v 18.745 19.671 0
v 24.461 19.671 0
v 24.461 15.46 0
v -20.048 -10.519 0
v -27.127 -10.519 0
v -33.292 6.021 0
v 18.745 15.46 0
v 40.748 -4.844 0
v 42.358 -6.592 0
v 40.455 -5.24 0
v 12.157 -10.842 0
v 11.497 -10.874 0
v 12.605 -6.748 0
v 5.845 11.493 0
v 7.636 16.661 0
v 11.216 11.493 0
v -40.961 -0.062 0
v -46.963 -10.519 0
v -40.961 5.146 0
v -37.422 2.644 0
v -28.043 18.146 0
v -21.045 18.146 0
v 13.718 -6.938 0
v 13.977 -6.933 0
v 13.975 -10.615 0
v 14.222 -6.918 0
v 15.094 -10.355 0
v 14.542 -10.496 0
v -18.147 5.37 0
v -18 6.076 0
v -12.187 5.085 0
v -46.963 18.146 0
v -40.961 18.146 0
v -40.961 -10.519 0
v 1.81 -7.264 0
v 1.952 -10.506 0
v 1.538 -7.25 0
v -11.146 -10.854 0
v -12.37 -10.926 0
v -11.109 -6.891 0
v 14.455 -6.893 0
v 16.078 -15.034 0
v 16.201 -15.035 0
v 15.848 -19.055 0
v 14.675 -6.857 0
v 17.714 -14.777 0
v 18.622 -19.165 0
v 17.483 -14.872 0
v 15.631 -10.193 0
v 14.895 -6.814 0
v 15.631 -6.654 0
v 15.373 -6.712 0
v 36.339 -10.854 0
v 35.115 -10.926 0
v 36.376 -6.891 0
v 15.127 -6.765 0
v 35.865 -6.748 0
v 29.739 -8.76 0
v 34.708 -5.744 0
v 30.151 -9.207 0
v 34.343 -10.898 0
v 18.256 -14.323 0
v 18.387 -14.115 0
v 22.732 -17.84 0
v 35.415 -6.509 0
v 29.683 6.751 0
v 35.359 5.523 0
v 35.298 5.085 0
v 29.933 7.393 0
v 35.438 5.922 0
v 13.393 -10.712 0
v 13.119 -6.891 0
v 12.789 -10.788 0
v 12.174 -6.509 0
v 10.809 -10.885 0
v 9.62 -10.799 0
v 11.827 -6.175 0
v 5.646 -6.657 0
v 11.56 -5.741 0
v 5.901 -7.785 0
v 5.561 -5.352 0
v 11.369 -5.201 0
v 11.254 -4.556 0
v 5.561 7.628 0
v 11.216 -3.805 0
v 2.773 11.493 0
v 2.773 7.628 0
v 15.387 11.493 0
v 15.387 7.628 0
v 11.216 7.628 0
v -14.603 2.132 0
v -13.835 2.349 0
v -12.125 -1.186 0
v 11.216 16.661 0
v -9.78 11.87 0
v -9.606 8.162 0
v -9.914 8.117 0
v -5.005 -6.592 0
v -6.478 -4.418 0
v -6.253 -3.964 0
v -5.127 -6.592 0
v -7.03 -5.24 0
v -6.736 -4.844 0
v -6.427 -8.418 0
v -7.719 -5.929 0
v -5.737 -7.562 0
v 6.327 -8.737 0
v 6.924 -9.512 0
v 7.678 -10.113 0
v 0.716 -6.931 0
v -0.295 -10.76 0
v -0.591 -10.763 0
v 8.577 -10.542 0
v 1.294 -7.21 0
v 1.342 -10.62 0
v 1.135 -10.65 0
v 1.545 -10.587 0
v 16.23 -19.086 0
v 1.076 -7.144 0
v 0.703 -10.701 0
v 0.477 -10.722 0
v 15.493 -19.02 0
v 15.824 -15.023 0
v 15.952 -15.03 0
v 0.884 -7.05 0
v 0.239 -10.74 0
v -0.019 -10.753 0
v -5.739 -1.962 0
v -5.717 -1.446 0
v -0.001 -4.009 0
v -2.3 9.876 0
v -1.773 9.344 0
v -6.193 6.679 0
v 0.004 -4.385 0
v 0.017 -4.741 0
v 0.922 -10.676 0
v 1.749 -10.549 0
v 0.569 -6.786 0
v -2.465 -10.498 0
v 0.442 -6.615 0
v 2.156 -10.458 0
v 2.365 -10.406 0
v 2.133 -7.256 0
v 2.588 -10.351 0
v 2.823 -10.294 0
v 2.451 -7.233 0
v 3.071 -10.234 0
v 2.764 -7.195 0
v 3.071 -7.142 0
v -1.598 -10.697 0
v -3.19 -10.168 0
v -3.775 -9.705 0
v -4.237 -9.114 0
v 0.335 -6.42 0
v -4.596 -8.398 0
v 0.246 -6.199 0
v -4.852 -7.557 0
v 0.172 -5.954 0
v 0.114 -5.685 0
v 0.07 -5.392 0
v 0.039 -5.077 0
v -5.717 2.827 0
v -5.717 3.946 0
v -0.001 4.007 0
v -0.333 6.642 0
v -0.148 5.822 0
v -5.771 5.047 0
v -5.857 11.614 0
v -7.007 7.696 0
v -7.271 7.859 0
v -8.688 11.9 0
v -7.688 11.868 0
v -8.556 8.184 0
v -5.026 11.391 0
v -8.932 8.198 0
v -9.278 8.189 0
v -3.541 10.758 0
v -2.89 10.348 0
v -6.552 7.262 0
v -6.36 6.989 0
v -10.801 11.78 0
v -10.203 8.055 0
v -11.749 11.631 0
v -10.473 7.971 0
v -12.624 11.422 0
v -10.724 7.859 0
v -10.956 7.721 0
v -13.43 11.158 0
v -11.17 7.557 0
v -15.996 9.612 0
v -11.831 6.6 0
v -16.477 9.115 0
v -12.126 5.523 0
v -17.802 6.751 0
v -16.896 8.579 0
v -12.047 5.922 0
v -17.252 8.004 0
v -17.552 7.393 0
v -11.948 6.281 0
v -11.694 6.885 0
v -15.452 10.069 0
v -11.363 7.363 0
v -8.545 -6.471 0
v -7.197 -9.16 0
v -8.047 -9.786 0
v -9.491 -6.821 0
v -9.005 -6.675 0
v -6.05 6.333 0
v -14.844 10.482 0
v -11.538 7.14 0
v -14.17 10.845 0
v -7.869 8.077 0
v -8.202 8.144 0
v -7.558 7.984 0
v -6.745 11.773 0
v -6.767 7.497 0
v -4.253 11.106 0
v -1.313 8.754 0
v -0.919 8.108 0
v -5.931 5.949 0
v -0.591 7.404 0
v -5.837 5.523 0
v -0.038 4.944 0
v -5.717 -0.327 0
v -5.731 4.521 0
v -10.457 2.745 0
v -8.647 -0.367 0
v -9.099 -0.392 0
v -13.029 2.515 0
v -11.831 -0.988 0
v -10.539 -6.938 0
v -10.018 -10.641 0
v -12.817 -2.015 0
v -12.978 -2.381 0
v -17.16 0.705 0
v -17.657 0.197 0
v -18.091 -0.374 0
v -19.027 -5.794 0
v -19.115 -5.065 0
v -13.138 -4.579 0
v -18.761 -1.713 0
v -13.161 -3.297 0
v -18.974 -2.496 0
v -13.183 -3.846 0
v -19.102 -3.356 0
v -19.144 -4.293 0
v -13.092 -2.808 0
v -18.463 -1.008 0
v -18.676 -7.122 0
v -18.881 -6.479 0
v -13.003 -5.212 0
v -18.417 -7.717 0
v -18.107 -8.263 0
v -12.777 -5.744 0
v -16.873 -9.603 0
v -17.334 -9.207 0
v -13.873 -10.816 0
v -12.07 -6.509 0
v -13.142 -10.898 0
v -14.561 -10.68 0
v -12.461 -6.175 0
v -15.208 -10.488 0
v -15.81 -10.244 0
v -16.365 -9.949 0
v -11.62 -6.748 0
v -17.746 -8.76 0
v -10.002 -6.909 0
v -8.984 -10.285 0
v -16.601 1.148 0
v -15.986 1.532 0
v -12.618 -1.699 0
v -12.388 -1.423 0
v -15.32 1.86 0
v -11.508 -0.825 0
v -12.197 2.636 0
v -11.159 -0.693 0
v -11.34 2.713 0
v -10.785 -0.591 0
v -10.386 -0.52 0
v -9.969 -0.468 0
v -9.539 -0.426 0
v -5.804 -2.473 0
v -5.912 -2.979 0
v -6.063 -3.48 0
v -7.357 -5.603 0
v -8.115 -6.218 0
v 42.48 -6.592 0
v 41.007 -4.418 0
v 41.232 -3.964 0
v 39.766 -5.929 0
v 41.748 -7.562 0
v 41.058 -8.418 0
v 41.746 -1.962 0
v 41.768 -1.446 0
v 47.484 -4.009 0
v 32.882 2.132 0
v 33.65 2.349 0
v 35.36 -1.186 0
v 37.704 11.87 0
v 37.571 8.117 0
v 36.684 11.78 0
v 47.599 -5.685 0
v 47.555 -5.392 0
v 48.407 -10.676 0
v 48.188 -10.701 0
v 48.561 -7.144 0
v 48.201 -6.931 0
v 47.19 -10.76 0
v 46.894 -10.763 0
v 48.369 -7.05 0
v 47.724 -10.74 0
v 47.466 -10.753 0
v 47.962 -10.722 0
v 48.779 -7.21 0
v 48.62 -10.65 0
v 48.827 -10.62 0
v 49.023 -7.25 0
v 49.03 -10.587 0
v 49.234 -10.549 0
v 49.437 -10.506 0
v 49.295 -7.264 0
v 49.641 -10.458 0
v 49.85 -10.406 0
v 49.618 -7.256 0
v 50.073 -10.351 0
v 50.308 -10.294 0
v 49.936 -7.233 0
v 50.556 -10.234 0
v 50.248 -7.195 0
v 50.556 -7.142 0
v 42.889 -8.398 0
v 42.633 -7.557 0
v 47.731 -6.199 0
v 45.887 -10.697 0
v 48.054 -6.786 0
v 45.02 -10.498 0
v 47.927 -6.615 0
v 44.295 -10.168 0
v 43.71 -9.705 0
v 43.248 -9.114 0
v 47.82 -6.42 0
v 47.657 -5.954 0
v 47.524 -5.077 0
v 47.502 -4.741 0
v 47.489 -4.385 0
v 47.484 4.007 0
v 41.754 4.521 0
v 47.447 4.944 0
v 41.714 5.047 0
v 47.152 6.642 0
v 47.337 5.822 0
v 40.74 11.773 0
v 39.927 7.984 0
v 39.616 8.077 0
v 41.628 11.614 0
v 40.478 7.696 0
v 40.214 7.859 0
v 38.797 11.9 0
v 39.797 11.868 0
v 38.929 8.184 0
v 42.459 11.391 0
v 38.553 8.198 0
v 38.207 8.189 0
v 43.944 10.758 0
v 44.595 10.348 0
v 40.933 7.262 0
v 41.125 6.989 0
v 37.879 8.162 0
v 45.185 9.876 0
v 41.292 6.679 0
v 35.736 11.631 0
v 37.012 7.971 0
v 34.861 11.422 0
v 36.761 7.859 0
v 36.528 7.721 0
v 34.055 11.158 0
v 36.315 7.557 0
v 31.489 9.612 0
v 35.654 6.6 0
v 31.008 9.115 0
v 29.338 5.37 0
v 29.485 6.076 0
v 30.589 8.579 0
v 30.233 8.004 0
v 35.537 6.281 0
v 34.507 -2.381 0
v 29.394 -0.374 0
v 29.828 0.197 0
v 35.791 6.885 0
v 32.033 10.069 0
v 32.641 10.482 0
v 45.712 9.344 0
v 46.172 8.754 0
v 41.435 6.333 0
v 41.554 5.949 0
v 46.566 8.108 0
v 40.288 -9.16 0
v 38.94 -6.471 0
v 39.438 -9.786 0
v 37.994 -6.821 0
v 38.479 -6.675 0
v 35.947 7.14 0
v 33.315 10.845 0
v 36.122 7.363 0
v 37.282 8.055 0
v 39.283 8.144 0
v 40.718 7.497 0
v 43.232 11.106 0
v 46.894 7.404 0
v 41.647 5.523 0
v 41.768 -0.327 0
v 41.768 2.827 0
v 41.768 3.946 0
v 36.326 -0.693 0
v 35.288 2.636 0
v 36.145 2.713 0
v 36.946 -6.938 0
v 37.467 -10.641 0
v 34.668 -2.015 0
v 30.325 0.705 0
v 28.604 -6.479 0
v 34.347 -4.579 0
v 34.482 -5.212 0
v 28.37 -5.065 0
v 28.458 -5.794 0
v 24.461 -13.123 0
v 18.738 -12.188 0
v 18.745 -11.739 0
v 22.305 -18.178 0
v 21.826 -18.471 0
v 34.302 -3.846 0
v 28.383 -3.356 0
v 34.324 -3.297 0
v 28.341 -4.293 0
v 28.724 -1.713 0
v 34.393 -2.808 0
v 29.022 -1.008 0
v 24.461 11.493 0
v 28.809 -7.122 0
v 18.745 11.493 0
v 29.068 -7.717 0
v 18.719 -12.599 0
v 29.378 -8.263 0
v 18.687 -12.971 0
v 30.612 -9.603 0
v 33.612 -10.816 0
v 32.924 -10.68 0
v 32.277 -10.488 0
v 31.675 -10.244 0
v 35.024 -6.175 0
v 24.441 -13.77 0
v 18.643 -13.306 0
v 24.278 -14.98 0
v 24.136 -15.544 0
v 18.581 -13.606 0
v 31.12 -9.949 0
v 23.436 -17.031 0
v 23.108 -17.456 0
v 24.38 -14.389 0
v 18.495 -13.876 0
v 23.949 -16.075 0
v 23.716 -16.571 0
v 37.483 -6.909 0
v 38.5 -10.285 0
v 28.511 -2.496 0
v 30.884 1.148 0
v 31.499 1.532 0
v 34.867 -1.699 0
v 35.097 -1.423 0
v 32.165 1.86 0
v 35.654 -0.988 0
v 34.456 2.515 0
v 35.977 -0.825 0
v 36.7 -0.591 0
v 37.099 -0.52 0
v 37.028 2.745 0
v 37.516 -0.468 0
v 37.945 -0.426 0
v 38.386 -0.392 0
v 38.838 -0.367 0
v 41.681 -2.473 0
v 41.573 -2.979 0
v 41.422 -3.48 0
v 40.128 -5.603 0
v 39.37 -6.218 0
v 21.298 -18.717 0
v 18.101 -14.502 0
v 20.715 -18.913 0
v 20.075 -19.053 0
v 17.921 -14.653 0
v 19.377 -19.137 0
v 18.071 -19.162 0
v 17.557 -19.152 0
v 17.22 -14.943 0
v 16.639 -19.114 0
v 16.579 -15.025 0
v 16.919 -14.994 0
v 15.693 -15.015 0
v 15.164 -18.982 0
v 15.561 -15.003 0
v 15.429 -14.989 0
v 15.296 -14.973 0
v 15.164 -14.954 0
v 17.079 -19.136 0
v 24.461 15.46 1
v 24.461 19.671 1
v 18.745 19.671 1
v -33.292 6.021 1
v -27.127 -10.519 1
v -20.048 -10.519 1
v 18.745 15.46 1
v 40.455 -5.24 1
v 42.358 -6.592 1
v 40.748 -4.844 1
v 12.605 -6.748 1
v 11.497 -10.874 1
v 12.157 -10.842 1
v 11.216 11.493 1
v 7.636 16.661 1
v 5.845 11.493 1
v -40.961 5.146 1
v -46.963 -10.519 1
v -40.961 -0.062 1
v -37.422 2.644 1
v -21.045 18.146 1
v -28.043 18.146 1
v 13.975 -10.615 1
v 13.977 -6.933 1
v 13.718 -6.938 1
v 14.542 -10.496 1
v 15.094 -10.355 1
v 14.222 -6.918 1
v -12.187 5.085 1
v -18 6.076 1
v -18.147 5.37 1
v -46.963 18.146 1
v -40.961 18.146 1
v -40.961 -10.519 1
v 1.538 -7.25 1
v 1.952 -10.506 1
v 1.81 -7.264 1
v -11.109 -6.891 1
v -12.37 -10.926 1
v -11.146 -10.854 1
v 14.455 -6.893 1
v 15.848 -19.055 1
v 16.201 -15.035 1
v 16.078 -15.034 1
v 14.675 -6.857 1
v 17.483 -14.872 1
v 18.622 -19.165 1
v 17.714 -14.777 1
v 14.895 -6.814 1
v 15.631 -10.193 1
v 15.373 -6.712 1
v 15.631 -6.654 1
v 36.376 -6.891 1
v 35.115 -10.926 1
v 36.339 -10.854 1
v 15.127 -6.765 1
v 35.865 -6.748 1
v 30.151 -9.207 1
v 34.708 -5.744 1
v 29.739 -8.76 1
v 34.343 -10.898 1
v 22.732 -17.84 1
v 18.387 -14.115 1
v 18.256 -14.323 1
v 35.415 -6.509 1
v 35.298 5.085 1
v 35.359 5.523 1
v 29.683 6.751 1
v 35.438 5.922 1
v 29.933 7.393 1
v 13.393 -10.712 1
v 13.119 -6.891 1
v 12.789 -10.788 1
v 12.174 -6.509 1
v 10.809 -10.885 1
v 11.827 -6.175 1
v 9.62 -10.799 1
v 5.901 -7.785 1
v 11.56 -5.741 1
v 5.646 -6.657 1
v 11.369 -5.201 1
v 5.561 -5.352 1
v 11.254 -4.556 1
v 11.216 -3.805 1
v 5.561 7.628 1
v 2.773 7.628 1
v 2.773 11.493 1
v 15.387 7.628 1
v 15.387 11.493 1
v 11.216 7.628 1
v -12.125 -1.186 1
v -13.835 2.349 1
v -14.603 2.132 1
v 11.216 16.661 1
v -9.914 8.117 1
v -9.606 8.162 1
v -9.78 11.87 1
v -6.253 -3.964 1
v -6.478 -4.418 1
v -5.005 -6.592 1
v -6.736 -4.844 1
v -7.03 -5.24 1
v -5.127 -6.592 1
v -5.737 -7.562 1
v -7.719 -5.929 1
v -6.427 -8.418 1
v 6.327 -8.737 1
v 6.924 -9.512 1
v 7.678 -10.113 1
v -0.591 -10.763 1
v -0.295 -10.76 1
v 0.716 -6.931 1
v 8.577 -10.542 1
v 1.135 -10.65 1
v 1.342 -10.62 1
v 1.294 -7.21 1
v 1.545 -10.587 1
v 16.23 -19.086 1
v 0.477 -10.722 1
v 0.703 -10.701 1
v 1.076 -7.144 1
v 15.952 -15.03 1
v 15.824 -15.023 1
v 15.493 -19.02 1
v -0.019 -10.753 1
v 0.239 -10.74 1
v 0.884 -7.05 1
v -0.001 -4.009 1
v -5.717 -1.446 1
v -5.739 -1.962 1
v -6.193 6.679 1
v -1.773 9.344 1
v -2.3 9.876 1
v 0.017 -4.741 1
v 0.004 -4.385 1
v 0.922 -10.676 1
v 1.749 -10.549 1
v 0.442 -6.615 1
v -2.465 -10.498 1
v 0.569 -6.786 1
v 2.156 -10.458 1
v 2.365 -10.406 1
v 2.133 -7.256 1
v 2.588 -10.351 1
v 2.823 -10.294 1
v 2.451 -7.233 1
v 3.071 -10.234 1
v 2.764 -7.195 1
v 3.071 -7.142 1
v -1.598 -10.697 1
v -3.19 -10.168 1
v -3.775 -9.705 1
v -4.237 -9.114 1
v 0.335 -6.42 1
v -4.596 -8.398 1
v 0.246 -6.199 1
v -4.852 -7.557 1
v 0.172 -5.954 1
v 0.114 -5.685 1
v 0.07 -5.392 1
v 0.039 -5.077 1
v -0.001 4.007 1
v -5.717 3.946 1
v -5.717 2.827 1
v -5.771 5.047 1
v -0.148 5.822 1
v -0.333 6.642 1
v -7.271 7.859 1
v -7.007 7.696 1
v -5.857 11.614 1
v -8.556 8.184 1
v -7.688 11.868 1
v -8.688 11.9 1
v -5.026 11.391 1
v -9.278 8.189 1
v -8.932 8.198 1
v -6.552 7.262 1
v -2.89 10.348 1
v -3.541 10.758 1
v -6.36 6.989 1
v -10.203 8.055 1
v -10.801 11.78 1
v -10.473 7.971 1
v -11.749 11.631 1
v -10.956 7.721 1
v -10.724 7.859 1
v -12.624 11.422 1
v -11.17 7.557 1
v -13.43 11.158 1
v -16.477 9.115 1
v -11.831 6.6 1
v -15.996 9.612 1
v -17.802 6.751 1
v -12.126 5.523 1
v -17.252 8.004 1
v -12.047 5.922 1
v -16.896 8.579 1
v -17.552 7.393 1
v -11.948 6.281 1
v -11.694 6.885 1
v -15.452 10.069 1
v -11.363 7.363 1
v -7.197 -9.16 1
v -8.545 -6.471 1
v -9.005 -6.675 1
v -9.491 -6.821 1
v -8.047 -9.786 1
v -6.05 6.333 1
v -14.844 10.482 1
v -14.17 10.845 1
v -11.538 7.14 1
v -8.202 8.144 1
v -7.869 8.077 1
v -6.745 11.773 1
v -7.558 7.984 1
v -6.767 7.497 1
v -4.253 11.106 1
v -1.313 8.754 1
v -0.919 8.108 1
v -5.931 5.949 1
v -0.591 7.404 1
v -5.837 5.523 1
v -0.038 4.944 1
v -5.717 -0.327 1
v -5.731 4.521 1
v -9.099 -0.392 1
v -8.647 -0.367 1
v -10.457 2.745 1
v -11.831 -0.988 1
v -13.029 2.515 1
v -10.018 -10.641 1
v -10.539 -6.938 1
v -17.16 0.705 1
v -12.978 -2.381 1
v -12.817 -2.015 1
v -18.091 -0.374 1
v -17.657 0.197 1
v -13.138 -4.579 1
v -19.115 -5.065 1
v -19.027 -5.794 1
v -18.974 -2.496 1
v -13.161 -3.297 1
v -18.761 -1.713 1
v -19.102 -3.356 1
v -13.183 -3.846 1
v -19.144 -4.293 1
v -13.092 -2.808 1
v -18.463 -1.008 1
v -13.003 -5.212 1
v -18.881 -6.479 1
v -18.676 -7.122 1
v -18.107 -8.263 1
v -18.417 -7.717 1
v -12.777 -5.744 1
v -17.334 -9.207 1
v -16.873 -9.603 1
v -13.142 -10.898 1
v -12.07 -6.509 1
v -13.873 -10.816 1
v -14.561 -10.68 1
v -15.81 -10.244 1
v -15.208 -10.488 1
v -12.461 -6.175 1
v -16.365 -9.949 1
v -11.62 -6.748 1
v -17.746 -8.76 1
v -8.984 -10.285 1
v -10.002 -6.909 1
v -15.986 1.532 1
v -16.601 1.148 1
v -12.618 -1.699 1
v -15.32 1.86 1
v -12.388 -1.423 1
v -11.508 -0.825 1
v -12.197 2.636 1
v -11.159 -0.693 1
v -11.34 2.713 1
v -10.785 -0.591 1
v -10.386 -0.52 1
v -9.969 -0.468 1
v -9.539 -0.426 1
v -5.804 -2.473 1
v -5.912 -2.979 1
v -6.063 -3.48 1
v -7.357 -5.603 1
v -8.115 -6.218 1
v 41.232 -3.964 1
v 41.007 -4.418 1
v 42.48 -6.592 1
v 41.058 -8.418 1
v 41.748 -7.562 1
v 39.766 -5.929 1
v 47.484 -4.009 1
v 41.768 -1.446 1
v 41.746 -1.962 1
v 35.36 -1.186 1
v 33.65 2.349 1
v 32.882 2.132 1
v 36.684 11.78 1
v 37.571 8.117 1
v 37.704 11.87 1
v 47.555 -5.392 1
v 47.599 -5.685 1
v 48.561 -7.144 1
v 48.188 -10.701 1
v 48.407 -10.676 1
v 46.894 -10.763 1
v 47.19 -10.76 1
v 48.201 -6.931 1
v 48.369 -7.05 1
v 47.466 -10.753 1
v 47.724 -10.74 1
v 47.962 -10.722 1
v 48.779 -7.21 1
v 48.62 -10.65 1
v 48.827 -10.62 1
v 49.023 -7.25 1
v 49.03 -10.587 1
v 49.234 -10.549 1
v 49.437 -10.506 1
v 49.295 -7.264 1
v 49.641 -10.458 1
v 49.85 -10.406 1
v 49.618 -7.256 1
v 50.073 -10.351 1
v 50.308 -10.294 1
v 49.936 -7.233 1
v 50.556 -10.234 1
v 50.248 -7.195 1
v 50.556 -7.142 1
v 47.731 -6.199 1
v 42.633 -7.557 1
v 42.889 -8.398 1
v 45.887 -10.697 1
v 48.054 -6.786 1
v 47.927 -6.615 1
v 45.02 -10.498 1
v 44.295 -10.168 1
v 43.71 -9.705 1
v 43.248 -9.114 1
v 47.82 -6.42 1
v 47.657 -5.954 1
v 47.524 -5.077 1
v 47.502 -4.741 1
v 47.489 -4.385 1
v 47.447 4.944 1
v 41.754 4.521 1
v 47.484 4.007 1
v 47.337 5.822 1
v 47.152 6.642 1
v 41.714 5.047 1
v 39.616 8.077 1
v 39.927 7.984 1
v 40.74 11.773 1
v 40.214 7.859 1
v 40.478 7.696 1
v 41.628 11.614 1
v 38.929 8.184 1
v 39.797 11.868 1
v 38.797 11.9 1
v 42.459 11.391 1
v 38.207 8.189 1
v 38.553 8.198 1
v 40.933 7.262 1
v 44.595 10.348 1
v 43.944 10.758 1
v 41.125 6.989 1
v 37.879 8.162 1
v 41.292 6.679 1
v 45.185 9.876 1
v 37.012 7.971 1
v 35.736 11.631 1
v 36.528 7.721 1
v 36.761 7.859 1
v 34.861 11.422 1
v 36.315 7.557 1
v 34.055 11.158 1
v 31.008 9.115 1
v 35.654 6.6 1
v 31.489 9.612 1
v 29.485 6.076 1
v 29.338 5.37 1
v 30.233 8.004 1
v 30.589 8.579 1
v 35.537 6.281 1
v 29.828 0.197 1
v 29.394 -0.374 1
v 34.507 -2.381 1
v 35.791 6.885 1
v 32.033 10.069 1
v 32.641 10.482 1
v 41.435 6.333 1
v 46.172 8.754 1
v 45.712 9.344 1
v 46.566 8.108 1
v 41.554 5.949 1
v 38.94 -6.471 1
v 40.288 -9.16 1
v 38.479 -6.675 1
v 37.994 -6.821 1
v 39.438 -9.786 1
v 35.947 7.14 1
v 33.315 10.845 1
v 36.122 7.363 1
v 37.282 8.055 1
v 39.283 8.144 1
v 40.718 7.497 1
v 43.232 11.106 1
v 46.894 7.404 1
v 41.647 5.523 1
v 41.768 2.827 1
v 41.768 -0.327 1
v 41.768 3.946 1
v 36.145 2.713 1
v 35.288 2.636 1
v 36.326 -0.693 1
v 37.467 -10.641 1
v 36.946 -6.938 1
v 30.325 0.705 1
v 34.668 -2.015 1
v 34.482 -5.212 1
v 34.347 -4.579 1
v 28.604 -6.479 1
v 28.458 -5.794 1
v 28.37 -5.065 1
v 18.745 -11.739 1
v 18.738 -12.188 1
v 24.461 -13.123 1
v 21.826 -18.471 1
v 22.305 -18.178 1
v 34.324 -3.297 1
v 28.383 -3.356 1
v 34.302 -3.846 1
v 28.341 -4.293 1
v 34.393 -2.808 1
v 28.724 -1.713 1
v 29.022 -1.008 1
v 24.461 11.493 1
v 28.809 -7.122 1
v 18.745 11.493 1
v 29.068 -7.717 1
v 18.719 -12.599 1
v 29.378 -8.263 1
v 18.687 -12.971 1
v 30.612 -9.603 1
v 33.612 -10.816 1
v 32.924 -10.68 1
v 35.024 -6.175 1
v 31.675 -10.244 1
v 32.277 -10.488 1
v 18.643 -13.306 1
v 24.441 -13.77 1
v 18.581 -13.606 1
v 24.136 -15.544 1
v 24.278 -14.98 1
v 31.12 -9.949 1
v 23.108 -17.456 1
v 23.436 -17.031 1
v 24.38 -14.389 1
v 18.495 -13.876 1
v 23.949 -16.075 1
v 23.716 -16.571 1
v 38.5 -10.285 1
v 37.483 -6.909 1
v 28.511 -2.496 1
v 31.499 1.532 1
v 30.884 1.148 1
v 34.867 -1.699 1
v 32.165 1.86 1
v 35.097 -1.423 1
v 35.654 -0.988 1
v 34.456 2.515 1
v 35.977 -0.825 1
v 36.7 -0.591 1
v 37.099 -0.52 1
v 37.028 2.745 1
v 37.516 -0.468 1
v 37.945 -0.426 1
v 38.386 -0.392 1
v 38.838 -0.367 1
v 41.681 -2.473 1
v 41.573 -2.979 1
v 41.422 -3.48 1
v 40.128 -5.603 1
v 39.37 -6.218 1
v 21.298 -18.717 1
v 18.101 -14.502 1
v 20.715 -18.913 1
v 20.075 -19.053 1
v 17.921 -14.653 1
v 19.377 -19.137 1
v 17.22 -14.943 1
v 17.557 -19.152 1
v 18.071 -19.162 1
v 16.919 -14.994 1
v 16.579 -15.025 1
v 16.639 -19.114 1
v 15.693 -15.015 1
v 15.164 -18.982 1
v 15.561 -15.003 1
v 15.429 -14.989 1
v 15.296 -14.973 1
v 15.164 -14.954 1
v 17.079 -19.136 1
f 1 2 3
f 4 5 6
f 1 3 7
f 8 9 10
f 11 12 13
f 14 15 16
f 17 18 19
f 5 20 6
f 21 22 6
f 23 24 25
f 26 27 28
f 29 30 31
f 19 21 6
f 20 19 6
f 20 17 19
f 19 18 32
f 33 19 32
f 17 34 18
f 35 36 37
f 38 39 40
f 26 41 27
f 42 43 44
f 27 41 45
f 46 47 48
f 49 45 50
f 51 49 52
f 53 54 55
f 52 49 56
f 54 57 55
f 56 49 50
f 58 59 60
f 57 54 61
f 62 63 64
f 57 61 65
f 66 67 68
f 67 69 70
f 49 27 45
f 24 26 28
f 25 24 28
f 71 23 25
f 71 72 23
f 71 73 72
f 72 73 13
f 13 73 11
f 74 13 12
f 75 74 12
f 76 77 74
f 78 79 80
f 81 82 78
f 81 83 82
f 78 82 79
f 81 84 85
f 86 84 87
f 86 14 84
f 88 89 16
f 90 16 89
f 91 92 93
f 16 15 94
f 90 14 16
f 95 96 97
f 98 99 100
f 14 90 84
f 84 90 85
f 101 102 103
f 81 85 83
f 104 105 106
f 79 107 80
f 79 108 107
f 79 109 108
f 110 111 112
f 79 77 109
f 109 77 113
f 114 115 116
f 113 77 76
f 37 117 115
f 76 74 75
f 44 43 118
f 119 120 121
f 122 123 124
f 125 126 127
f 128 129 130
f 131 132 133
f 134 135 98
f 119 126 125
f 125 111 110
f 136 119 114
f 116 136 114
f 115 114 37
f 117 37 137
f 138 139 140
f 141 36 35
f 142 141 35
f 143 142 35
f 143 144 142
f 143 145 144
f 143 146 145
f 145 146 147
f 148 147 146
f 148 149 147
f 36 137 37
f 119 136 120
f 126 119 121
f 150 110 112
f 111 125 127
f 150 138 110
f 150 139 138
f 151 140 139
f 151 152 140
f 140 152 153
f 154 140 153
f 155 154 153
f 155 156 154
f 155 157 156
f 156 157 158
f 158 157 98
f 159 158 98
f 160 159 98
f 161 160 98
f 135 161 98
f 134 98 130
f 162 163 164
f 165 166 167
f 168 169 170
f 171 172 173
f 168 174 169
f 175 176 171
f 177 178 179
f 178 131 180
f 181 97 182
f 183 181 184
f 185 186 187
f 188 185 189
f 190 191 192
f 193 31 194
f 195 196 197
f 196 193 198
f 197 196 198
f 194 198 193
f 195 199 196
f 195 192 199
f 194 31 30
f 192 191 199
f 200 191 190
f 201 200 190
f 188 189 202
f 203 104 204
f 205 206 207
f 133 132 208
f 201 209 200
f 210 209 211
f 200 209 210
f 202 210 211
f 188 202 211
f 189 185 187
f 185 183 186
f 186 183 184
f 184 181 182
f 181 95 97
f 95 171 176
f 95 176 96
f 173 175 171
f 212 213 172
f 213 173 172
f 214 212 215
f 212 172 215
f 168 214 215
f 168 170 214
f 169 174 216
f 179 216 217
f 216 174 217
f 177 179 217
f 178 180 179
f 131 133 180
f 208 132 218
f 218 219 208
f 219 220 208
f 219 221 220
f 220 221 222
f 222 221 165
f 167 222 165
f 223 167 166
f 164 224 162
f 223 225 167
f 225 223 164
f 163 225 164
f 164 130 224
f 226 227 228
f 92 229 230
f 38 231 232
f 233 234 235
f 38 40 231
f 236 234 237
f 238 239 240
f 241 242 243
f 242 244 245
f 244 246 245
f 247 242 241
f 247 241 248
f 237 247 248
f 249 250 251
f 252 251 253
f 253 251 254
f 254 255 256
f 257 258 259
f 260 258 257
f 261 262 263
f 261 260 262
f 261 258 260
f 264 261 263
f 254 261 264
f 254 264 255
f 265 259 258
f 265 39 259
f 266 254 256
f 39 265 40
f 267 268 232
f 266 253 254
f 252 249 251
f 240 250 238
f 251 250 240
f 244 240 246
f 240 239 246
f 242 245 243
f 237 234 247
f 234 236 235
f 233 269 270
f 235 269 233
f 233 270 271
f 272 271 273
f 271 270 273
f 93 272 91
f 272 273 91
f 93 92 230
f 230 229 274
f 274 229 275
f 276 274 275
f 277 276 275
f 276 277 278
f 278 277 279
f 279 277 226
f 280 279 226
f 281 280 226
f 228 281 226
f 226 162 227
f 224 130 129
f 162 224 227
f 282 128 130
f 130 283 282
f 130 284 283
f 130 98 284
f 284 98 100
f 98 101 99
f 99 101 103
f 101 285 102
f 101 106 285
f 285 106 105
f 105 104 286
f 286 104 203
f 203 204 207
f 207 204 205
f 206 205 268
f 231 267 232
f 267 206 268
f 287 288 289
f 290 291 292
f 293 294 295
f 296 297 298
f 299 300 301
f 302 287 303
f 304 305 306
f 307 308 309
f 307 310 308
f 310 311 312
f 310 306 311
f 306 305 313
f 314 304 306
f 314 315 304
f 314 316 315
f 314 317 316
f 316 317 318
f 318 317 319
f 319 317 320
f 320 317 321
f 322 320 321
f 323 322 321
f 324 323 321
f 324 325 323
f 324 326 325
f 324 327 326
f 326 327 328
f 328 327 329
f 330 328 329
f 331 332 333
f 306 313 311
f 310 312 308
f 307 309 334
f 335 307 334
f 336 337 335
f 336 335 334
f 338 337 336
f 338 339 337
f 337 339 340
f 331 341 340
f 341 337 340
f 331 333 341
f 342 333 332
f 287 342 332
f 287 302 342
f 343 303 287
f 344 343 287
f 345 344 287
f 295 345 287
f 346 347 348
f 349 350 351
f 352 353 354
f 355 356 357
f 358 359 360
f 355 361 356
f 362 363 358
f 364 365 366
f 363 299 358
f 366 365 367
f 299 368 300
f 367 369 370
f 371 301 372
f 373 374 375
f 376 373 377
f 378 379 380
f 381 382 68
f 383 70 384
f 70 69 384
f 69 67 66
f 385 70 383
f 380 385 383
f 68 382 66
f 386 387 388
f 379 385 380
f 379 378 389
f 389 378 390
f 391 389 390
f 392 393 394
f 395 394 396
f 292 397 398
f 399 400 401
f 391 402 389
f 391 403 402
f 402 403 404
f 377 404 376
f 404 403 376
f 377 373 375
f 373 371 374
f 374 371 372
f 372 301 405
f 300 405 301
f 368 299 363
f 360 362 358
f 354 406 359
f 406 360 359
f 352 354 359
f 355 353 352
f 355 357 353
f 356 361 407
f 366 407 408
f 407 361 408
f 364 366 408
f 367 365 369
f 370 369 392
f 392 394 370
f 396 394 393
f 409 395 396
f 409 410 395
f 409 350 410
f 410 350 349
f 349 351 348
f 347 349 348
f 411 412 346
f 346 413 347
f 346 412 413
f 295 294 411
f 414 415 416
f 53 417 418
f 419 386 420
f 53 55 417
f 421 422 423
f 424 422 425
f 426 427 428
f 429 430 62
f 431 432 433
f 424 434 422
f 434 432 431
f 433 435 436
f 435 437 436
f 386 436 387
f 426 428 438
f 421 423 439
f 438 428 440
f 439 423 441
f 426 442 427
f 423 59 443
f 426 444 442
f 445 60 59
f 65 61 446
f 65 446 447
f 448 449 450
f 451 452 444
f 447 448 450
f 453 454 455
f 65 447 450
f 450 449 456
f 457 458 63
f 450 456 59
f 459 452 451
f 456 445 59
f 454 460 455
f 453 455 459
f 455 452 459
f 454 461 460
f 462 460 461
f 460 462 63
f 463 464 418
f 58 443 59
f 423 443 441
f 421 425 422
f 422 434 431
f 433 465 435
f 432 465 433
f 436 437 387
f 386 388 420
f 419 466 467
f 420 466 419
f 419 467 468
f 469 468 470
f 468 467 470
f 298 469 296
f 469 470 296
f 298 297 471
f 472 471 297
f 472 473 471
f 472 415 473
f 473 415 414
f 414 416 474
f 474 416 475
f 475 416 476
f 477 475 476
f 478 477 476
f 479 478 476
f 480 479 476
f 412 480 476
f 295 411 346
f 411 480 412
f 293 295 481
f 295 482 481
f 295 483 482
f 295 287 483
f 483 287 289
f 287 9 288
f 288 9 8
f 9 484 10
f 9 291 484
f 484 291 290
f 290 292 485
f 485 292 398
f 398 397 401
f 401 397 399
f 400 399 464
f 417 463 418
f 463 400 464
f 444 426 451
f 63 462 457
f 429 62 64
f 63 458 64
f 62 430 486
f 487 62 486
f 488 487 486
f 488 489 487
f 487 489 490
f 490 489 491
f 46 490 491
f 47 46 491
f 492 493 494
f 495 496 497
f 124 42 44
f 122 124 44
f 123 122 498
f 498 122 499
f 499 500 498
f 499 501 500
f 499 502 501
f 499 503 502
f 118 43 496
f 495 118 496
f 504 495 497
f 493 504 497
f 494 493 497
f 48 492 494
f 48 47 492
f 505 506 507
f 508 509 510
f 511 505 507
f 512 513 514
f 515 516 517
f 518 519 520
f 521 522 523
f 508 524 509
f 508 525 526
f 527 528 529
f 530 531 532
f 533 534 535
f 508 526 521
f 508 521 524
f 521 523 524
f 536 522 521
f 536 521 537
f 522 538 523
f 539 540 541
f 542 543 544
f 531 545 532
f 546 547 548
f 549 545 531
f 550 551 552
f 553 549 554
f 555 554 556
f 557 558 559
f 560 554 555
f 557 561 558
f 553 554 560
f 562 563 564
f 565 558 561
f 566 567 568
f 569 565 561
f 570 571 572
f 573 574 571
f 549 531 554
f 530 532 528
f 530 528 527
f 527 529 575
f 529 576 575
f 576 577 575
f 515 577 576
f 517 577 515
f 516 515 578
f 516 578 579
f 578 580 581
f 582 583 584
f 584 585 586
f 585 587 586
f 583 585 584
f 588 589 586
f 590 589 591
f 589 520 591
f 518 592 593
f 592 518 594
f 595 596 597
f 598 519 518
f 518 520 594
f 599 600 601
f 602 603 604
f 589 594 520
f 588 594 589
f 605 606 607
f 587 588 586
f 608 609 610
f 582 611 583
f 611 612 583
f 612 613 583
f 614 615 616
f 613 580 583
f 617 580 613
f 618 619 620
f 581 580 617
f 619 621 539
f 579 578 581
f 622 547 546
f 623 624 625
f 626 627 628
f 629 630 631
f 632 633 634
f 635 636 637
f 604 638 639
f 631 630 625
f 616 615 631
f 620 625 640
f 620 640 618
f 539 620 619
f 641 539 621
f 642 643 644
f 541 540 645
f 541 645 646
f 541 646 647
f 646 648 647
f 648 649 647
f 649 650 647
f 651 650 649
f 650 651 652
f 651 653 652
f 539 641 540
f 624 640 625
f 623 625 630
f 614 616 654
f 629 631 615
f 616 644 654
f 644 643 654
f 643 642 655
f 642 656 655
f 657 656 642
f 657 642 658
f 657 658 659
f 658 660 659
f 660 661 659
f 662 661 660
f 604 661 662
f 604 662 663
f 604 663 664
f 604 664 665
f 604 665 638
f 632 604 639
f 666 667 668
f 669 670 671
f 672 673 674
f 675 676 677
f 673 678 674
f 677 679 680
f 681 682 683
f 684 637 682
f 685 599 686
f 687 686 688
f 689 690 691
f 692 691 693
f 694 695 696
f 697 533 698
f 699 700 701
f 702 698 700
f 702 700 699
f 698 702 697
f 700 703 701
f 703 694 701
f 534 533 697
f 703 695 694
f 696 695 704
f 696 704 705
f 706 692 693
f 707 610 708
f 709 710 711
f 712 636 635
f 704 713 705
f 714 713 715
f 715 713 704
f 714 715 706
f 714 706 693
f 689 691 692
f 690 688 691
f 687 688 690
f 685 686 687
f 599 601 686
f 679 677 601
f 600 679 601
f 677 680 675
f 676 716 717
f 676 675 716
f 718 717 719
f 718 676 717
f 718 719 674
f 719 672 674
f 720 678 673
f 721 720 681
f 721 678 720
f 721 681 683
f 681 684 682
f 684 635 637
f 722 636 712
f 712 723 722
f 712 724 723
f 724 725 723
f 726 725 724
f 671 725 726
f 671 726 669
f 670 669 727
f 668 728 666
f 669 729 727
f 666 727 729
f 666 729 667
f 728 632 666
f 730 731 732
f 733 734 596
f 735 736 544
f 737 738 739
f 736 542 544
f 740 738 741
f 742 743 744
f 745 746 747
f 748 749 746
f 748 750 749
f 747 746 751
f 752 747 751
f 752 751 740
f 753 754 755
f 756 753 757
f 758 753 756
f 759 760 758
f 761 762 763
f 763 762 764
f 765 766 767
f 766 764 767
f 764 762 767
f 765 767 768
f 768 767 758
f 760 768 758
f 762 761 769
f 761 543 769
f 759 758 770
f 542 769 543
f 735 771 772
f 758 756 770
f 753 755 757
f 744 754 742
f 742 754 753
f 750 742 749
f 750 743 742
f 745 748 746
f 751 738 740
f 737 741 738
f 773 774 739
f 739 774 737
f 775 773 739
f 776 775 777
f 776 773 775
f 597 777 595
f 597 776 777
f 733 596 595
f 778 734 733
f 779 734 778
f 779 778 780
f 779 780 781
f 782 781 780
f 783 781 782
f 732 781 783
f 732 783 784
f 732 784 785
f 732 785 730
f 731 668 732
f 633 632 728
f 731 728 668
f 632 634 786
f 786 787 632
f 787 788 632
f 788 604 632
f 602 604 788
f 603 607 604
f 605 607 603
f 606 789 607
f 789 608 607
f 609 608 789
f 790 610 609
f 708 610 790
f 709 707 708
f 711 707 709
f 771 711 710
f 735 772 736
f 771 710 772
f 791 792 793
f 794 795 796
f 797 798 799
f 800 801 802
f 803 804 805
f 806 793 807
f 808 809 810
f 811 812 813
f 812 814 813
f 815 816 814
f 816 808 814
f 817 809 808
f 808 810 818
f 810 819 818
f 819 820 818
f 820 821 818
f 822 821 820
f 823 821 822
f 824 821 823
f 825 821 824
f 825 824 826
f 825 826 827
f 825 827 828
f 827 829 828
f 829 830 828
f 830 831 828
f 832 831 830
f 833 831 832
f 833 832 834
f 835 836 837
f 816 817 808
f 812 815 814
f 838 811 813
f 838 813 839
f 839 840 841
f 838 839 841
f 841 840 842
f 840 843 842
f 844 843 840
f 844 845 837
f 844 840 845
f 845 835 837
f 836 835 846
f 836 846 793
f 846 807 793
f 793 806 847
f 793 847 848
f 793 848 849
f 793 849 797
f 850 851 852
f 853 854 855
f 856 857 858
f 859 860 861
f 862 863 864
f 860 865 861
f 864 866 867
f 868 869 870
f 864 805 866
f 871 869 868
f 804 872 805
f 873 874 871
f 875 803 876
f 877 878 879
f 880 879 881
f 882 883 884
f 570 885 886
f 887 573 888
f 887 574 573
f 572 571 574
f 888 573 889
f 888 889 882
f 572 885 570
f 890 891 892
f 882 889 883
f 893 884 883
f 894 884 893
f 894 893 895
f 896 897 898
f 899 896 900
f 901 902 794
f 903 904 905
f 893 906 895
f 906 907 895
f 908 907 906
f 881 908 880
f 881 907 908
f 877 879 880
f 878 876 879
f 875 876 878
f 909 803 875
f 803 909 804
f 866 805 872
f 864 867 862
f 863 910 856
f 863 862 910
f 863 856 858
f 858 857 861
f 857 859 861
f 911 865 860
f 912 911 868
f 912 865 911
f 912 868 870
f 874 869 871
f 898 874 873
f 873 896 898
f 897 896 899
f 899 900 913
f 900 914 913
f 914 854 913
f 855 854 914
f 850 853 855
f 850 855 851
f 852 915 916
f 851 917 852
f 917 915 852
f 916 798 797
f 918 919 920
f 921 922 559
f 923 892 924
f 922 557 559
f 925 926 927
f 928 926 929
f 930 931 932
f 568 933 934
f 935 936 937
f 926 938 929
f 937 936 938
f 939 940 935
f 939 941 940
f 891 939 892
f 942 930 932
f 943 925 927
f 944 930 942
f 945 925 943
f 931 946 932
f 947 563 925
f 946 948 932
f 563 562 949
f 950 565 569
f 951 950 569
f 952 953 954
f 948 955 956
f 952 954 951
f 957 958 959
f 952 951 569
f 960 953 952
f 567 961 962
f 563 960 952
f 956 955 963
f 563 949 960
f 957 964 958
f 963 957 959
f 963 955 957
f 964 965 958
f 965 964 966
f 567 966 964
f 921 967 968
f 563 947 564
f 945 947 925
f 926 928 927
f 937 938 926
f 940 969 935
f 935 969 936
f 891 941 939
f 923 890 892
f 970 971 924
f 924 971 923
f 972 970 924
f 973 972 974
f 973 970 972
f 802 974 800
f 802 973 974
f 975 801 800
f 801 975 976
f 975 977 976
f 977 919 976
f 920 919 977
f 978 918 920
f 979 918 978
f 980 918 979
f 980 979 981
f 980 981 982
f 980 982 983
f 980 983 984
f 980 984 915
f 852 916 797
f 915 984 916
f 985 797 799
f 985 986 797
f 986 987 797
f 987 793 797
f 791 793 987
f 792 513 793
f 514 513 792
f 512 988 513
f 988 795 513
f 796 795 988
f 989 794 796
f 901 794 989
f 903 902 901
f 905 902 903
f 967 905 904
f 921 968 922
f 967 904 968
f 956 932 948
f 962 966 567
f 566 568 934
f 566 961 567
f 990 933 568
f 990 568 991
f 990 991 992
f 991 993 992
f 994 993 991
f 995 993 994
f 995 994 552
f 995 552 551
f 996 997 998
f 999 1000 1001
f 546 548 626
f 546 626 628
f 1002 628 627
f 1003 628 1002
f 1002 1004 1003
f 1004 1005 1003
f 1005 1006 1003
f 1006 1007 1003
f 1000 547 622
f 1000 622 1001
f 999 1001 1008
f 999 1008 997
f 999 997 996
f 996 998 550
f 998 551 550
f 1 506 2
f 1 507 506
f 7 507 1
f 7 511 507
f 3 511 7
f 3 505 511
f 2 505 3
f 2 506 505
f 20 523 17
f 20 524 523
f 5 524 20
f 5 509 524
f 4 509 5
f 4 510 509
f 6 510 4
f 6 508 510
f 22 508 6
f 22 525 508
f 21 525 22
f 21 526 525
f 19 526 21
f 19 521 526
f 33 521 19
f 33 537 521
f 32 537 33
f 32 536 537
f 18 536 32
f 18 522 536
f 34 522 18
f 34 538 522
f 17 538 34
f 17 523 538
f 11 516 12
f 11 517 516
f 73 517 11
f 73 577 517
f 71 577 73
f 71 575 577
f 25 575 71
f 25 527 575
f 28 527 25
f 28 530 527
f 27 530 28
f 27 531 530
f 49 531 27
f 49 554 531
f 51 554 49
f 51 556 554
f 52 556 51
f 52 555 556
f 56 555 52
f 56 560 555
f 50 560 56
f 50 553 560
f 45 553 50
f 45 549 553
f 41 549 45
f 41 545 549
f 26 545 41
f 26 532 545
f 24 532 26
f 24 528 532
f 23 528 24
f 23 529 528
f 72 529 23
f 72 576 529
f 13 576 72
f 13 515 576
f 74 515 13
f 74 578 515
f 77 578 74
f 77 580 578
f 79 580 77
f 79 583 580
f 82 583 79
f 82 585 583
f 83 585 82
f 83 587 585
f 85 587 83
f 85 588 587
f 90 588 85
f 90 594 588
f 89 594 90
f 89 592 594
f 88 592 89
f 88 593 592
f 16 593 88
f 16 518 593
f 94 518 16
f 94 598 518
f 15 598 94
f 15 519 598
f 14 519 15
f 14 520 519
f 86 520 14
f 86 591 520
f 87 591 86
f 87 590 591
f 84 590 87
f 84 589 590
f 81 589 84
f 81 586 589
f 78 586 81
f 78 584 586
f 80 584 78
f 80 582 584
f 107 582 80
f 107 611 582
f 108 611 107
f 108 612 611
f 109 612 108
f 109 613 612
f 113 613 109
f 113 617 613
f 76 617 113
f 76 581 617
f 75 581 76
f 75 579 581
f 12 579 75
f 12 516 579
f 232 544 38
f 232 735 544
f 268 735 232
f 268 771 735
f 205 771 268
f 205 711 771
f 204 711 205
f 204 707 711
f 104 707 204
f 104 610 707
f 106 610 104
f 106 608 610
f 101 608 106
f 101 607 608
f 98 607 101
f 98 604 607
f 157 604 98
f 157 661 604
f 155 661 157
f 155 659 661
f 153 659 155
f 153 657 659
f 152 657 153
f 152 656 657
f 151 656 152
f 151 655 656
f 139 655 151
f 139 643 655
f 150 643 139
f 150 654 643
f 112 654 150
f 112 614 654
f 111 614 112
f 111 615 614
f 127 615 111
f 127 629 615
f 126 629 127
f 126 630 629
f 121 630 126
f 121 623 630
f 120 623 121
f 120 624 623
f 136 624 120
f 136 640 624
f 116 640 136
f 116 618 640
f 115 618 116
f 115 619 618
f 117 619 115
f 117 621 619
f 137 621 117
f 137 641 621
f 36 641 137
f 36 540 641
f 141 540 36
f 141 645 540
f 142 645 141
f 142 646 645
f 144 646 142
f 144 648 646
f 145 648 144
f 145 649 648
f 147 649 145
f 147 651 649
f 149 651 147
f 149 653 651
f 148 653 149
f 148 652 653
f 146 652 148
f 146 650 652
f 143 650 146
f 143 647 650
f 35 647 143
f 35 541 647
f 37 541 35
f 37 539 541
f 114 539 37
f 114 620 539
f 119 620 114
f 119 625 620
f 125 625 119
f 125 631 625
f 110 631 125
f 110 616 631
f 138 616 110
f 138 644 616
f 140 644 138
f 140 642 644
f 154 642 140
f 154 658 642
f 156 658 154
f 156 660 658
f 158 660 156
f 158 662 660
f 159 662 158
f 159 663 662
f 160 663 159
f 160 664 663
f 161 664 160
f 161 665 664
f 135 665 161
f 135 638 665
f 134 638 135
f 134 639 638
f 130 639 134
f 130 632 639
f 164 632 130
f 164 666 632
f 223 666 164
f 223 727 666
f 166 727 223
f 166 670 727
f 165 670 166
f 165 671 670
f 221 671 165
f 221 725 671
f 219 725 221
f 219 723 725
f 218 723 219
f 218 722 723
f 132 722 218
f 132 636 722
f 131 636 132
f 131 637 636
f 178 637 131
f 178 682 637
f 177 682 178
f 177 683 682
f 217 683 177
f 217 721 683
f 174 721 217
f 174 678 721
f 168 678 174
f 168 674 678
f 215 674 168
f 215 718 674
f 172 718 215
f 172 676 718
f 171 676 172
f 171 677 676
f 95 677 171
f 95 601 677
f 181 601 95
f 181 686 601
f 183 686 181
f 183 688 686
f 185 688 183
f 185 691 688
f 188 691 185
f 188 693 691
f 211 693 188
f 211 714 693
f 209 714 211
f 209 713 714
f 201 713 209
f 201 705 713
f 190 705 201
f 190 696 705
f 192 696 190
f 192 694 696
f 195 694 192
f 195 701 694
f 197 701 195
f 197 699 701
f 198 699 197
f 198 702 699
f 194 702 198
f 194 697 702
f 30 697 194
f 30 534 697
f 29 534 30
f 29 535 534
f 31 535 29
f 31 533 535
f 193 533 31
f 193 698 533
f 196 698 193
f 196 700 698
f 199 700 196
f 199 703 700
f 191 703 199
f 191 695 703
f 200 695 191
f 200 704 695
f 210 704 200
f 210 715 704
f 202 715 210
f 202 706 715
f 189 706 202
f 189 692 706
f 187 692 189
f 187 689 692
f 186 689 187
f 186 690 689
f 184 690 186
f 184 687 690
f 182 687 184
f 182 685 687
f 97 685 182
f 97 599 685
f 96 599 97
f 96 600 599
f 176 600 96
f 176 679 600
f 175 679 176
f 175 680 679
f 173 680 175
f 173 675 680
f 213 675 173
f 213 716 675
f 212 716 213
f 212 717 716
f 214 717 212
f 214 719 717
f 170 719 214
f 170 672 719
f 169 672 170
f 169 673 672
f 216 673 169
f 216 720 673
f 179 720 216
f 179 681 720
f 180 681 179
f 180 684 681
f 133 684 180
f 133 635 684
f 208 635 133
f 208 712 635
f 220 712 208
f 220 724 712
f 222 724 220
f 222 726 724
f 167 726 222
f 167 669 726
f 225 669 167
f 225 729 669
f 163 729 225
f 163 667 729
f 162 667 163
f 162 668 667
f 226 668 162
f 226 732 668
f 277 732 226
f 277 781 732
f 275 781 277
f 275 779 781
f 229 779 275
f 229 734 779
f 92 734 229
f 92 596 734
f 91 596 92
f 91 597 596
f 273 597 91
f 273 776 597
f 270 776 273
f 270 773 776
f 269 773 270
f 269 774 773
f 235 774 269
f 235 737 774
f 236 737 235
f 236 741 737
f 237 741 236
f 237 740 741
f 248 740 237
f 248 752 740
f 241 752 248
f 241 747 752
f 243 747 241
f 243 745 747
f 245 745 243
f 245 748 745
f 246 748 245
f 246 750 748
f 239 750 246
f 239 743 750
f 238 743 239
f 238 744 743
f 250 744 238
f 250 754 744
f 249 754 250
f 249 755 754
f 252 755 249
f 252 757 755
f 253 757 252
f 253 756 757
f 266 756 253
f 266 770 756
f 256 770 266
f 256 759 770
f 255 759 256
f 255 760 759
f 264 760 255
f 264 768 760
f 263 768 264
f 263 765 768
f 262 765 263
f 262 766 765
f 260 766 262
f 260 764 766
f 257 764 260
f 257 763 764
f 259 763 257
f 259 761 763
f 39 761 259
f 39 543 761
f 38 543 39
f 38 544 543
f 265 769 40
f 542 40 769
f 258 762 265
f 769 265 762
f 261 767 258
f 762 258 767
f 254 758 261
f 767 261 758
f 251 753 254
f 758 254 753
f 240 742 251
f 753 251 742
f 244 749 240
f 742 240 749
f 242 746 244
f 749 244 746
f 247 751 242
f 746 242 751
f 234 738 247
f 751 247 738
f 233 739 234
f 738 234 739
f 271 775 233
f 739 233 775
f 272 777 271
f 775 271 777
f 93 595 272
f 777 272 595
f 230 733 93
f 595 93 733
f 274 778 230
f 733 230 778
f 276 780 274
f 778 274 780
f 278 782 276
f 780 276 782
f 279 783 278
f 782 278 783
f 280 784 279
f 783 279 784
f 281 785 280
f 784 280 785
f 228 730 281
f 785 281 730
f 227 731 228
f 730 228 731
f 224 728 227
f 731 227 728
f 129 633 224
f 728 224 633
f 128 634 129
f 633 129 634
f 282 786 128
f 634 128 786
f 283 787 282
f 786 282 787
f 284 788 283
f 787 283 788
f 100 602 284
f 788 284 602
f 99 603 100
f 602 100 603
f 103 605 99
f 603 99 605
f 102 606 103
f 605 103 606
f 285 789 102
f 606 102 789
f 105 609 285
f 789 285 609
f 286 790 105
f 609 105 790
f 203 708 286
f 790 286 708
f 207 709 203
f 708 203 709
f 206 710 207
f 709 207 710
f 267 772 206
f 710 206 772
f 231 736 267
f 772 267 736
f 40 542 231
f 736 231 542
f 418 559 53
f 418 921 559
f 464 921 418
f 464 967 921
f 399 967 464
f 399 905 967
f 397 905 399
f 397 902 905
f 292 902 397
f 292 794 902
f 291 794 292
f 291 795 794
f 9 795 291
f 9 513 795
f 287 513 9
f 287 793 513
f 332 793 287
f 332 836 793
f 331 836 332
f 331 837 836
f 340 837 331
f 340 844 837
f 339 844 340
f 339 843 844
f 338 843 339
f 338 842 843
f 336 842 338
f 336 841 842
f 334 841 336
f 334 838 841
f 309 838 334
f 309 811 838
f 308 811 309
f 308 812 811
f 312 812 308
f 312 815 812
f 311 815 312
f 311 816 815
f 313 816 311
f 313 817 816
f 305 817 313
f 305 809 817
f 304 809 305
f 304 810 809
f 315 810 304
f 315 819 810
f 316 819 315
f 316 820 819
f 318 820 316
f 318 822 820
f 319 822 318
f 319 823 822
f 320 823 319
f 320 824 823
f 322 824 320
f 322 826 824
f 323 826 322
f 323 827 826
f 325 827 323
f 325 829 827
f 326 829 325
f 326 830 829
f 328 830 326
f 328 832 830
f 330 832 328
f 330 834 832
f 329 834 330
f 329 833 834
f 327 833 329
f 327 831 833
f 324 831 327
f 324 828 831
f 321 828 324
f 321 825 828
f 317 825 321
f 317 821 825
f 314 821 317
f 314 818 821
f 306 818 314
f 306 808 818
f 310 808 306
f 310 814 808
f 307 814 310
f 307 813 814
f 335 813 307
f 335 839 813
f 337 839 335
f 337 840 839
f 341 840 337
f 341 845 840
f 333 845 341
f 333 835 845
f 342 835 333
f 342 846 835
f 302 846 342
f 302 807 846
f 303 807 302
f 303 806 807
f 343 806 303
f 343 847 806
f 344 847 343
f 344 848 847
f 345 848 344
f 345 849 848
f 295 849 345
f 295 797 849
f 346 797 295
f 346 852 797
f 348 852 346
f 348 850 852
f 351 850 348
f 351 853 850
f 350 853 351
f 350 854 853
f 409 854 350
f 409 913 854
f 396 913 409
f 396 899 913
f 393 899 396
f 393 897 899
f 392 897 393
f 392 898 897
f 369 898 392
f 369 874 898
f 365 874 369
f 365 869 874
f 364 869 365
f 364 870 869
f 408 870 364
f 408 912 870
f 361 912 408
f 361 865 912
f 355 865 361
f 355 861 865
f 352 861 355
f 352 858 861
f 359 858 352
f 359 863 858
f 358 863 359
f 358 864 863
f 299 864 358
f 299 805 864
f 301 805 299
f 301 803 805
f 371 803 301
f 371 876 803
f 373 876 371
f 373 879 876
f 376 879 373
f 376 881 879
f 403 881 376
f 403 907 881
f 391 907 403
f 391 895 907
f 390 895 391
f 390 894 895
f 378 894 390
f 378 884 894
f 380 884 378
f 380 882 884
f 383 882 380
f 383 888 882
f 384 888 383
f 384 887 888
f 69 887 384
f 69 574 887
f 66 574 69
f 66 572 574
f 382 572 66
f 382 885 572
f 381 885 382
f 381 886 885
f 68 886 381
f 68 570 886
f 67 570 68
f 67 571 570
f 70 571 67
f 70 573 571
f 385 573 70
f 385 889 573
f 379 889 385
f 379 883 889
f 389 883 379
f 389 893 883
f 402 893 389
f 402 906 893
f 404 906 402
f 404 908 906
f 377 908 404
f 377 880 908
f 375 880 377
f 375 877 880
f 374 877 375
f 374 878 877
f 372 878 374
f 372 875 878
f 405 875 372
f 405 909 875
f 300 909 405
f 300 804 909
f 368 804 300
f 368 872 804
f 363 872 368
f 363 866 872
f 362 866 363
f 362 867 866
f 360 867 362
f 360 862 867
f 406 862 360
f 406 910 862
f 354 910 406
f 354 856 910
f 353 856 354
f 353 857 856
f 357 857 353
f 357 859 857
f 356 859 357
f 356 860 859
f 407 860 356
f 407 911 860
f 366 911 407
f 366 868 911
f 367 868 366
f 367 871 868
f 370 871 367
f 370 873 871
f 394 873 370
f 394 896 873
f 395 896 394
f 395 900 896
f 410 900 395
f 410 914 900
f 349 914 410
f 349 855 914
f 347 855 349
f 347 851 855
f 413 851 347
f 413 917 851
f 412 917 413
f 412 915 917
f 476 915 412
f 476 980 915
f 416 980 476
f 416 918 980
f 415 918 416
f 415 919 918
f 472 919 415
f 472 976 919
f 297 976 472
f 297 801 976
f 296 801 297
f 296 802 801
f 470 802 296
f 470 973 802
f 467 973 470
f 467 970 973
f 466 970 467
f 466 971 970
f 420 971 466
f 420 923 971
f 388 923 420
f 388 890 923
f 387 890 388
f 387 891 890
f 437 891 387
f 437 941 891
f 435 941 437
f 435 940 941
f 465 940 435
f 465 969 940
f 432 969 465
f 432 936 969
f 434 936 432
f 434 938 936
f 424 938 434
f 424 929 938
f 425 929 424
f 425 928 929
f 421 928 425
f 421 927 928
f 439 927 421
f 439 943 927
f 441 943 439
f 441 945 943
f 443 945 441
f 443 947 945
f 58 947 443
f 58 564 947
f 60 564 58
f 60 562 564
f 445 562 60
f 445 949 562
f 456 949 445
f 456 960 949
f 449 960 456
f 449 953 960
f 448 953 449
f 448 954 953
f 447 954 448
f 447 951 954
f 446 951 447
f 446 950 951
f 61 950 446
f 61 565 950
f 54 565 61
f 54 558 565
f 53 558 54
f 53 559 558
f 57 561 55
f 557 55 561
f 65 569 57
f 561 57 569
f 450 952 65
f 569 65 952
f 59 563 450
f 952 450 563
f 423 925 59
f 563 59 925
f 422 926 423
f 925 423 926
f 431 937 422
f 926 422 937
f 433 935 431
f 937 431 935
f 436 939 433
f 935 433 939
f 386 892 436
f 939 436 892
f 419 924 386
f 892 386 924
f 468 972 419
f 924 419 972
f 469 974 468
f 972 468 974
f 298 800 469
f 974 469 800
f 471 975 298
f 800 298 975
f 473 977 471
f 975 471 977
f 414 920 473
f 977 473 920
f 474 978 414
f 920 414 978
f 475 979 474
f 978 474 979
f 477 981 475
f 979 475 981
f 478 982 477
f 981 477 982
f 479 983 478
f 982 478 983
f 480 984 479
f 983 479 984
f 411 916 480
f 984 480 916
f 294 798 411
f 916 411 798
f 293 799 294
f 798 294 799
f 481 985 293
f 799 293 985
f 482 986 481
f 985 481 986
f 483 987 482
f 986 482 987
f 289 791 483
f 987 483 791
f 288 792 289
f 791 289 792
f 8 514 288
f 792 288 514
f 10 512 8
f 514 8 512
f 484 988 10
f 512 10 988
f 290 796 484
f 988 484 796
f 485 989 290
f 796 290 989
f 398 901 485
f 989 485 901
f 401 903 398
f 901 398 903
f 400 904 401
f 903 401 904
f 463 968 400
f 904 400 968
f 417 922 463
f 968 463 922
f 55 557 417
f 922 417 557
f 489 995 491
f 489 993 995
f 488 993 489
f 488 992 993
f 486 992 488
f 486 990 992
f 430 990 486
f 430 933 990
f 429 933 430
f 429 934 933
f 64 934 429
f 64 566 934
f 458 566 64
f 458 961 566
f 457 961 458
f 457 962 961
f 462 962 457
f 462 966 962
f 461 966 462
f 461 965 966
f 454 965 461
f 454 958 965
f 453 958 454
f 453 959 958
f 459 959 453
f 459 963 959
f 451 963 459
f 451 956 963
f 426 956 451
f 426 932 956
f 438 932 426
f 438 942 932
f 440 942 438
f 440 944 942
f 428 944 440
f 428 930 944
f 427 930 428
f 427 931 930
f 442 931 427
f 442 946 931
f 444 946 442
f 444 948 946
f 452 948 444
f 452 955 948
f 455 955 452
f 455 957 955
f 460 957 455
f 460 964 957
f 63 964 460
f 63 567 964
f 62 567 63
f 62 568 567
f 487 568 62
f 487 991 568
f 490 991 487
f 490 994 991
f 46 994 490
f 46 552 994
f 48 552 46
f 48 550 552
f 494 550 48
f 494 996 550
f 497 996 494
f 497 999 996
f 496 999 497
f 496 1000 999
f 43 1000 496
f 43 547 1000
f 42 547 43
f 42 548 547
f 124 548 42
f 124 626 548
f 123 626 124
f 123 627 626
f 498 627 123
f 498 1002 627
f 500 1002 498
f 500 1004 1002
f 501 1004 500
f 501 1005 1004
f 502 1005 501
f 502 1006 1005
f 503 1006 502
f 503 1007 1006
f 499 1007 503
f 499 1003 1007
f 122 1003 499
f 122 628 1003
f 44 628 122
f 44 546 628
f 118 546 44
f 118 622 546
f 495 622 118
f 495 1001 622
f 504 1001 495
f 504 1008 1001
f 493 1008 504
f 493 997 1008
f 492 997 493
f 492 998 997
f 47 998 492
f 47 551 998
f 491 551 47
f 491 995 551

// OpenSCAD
// license Jonas Immanuel Frey GPL

// --- parameters ---
text_content   = "Katja";
font_size      = 30;       // mm
extrude_depth  = 1;        // mm — how tall/thick the letters are
font_name      = "Liberation Sans:style=Bold";
add_base_plate = false;    // flat plate underneath the text
base_thickness = 0;        // mm — thickness of base plate
base_padding   = 3;        // mm — extra space around text on base plate

// --- text object ---
translate([0, 0, add_base_plate ? base_thickness : 0])
    linear_extrude(height = extrude_depth)
        text(text_content, size = font_size, font = font_name, halign = "center", valign = "center");

// --- optional base plate ---
if (add_base_plate) {
    text_width  = len(text_content) * font_size * 0.65;  // rough estimate
    text_height = font_size;

    translate([- text_width / 2 - base_padding, -text_height / 2 - base_padding, 0])
        cube([text_width + base_padding * 2, text_height + base_padding * 2, base_thickness]);
}
